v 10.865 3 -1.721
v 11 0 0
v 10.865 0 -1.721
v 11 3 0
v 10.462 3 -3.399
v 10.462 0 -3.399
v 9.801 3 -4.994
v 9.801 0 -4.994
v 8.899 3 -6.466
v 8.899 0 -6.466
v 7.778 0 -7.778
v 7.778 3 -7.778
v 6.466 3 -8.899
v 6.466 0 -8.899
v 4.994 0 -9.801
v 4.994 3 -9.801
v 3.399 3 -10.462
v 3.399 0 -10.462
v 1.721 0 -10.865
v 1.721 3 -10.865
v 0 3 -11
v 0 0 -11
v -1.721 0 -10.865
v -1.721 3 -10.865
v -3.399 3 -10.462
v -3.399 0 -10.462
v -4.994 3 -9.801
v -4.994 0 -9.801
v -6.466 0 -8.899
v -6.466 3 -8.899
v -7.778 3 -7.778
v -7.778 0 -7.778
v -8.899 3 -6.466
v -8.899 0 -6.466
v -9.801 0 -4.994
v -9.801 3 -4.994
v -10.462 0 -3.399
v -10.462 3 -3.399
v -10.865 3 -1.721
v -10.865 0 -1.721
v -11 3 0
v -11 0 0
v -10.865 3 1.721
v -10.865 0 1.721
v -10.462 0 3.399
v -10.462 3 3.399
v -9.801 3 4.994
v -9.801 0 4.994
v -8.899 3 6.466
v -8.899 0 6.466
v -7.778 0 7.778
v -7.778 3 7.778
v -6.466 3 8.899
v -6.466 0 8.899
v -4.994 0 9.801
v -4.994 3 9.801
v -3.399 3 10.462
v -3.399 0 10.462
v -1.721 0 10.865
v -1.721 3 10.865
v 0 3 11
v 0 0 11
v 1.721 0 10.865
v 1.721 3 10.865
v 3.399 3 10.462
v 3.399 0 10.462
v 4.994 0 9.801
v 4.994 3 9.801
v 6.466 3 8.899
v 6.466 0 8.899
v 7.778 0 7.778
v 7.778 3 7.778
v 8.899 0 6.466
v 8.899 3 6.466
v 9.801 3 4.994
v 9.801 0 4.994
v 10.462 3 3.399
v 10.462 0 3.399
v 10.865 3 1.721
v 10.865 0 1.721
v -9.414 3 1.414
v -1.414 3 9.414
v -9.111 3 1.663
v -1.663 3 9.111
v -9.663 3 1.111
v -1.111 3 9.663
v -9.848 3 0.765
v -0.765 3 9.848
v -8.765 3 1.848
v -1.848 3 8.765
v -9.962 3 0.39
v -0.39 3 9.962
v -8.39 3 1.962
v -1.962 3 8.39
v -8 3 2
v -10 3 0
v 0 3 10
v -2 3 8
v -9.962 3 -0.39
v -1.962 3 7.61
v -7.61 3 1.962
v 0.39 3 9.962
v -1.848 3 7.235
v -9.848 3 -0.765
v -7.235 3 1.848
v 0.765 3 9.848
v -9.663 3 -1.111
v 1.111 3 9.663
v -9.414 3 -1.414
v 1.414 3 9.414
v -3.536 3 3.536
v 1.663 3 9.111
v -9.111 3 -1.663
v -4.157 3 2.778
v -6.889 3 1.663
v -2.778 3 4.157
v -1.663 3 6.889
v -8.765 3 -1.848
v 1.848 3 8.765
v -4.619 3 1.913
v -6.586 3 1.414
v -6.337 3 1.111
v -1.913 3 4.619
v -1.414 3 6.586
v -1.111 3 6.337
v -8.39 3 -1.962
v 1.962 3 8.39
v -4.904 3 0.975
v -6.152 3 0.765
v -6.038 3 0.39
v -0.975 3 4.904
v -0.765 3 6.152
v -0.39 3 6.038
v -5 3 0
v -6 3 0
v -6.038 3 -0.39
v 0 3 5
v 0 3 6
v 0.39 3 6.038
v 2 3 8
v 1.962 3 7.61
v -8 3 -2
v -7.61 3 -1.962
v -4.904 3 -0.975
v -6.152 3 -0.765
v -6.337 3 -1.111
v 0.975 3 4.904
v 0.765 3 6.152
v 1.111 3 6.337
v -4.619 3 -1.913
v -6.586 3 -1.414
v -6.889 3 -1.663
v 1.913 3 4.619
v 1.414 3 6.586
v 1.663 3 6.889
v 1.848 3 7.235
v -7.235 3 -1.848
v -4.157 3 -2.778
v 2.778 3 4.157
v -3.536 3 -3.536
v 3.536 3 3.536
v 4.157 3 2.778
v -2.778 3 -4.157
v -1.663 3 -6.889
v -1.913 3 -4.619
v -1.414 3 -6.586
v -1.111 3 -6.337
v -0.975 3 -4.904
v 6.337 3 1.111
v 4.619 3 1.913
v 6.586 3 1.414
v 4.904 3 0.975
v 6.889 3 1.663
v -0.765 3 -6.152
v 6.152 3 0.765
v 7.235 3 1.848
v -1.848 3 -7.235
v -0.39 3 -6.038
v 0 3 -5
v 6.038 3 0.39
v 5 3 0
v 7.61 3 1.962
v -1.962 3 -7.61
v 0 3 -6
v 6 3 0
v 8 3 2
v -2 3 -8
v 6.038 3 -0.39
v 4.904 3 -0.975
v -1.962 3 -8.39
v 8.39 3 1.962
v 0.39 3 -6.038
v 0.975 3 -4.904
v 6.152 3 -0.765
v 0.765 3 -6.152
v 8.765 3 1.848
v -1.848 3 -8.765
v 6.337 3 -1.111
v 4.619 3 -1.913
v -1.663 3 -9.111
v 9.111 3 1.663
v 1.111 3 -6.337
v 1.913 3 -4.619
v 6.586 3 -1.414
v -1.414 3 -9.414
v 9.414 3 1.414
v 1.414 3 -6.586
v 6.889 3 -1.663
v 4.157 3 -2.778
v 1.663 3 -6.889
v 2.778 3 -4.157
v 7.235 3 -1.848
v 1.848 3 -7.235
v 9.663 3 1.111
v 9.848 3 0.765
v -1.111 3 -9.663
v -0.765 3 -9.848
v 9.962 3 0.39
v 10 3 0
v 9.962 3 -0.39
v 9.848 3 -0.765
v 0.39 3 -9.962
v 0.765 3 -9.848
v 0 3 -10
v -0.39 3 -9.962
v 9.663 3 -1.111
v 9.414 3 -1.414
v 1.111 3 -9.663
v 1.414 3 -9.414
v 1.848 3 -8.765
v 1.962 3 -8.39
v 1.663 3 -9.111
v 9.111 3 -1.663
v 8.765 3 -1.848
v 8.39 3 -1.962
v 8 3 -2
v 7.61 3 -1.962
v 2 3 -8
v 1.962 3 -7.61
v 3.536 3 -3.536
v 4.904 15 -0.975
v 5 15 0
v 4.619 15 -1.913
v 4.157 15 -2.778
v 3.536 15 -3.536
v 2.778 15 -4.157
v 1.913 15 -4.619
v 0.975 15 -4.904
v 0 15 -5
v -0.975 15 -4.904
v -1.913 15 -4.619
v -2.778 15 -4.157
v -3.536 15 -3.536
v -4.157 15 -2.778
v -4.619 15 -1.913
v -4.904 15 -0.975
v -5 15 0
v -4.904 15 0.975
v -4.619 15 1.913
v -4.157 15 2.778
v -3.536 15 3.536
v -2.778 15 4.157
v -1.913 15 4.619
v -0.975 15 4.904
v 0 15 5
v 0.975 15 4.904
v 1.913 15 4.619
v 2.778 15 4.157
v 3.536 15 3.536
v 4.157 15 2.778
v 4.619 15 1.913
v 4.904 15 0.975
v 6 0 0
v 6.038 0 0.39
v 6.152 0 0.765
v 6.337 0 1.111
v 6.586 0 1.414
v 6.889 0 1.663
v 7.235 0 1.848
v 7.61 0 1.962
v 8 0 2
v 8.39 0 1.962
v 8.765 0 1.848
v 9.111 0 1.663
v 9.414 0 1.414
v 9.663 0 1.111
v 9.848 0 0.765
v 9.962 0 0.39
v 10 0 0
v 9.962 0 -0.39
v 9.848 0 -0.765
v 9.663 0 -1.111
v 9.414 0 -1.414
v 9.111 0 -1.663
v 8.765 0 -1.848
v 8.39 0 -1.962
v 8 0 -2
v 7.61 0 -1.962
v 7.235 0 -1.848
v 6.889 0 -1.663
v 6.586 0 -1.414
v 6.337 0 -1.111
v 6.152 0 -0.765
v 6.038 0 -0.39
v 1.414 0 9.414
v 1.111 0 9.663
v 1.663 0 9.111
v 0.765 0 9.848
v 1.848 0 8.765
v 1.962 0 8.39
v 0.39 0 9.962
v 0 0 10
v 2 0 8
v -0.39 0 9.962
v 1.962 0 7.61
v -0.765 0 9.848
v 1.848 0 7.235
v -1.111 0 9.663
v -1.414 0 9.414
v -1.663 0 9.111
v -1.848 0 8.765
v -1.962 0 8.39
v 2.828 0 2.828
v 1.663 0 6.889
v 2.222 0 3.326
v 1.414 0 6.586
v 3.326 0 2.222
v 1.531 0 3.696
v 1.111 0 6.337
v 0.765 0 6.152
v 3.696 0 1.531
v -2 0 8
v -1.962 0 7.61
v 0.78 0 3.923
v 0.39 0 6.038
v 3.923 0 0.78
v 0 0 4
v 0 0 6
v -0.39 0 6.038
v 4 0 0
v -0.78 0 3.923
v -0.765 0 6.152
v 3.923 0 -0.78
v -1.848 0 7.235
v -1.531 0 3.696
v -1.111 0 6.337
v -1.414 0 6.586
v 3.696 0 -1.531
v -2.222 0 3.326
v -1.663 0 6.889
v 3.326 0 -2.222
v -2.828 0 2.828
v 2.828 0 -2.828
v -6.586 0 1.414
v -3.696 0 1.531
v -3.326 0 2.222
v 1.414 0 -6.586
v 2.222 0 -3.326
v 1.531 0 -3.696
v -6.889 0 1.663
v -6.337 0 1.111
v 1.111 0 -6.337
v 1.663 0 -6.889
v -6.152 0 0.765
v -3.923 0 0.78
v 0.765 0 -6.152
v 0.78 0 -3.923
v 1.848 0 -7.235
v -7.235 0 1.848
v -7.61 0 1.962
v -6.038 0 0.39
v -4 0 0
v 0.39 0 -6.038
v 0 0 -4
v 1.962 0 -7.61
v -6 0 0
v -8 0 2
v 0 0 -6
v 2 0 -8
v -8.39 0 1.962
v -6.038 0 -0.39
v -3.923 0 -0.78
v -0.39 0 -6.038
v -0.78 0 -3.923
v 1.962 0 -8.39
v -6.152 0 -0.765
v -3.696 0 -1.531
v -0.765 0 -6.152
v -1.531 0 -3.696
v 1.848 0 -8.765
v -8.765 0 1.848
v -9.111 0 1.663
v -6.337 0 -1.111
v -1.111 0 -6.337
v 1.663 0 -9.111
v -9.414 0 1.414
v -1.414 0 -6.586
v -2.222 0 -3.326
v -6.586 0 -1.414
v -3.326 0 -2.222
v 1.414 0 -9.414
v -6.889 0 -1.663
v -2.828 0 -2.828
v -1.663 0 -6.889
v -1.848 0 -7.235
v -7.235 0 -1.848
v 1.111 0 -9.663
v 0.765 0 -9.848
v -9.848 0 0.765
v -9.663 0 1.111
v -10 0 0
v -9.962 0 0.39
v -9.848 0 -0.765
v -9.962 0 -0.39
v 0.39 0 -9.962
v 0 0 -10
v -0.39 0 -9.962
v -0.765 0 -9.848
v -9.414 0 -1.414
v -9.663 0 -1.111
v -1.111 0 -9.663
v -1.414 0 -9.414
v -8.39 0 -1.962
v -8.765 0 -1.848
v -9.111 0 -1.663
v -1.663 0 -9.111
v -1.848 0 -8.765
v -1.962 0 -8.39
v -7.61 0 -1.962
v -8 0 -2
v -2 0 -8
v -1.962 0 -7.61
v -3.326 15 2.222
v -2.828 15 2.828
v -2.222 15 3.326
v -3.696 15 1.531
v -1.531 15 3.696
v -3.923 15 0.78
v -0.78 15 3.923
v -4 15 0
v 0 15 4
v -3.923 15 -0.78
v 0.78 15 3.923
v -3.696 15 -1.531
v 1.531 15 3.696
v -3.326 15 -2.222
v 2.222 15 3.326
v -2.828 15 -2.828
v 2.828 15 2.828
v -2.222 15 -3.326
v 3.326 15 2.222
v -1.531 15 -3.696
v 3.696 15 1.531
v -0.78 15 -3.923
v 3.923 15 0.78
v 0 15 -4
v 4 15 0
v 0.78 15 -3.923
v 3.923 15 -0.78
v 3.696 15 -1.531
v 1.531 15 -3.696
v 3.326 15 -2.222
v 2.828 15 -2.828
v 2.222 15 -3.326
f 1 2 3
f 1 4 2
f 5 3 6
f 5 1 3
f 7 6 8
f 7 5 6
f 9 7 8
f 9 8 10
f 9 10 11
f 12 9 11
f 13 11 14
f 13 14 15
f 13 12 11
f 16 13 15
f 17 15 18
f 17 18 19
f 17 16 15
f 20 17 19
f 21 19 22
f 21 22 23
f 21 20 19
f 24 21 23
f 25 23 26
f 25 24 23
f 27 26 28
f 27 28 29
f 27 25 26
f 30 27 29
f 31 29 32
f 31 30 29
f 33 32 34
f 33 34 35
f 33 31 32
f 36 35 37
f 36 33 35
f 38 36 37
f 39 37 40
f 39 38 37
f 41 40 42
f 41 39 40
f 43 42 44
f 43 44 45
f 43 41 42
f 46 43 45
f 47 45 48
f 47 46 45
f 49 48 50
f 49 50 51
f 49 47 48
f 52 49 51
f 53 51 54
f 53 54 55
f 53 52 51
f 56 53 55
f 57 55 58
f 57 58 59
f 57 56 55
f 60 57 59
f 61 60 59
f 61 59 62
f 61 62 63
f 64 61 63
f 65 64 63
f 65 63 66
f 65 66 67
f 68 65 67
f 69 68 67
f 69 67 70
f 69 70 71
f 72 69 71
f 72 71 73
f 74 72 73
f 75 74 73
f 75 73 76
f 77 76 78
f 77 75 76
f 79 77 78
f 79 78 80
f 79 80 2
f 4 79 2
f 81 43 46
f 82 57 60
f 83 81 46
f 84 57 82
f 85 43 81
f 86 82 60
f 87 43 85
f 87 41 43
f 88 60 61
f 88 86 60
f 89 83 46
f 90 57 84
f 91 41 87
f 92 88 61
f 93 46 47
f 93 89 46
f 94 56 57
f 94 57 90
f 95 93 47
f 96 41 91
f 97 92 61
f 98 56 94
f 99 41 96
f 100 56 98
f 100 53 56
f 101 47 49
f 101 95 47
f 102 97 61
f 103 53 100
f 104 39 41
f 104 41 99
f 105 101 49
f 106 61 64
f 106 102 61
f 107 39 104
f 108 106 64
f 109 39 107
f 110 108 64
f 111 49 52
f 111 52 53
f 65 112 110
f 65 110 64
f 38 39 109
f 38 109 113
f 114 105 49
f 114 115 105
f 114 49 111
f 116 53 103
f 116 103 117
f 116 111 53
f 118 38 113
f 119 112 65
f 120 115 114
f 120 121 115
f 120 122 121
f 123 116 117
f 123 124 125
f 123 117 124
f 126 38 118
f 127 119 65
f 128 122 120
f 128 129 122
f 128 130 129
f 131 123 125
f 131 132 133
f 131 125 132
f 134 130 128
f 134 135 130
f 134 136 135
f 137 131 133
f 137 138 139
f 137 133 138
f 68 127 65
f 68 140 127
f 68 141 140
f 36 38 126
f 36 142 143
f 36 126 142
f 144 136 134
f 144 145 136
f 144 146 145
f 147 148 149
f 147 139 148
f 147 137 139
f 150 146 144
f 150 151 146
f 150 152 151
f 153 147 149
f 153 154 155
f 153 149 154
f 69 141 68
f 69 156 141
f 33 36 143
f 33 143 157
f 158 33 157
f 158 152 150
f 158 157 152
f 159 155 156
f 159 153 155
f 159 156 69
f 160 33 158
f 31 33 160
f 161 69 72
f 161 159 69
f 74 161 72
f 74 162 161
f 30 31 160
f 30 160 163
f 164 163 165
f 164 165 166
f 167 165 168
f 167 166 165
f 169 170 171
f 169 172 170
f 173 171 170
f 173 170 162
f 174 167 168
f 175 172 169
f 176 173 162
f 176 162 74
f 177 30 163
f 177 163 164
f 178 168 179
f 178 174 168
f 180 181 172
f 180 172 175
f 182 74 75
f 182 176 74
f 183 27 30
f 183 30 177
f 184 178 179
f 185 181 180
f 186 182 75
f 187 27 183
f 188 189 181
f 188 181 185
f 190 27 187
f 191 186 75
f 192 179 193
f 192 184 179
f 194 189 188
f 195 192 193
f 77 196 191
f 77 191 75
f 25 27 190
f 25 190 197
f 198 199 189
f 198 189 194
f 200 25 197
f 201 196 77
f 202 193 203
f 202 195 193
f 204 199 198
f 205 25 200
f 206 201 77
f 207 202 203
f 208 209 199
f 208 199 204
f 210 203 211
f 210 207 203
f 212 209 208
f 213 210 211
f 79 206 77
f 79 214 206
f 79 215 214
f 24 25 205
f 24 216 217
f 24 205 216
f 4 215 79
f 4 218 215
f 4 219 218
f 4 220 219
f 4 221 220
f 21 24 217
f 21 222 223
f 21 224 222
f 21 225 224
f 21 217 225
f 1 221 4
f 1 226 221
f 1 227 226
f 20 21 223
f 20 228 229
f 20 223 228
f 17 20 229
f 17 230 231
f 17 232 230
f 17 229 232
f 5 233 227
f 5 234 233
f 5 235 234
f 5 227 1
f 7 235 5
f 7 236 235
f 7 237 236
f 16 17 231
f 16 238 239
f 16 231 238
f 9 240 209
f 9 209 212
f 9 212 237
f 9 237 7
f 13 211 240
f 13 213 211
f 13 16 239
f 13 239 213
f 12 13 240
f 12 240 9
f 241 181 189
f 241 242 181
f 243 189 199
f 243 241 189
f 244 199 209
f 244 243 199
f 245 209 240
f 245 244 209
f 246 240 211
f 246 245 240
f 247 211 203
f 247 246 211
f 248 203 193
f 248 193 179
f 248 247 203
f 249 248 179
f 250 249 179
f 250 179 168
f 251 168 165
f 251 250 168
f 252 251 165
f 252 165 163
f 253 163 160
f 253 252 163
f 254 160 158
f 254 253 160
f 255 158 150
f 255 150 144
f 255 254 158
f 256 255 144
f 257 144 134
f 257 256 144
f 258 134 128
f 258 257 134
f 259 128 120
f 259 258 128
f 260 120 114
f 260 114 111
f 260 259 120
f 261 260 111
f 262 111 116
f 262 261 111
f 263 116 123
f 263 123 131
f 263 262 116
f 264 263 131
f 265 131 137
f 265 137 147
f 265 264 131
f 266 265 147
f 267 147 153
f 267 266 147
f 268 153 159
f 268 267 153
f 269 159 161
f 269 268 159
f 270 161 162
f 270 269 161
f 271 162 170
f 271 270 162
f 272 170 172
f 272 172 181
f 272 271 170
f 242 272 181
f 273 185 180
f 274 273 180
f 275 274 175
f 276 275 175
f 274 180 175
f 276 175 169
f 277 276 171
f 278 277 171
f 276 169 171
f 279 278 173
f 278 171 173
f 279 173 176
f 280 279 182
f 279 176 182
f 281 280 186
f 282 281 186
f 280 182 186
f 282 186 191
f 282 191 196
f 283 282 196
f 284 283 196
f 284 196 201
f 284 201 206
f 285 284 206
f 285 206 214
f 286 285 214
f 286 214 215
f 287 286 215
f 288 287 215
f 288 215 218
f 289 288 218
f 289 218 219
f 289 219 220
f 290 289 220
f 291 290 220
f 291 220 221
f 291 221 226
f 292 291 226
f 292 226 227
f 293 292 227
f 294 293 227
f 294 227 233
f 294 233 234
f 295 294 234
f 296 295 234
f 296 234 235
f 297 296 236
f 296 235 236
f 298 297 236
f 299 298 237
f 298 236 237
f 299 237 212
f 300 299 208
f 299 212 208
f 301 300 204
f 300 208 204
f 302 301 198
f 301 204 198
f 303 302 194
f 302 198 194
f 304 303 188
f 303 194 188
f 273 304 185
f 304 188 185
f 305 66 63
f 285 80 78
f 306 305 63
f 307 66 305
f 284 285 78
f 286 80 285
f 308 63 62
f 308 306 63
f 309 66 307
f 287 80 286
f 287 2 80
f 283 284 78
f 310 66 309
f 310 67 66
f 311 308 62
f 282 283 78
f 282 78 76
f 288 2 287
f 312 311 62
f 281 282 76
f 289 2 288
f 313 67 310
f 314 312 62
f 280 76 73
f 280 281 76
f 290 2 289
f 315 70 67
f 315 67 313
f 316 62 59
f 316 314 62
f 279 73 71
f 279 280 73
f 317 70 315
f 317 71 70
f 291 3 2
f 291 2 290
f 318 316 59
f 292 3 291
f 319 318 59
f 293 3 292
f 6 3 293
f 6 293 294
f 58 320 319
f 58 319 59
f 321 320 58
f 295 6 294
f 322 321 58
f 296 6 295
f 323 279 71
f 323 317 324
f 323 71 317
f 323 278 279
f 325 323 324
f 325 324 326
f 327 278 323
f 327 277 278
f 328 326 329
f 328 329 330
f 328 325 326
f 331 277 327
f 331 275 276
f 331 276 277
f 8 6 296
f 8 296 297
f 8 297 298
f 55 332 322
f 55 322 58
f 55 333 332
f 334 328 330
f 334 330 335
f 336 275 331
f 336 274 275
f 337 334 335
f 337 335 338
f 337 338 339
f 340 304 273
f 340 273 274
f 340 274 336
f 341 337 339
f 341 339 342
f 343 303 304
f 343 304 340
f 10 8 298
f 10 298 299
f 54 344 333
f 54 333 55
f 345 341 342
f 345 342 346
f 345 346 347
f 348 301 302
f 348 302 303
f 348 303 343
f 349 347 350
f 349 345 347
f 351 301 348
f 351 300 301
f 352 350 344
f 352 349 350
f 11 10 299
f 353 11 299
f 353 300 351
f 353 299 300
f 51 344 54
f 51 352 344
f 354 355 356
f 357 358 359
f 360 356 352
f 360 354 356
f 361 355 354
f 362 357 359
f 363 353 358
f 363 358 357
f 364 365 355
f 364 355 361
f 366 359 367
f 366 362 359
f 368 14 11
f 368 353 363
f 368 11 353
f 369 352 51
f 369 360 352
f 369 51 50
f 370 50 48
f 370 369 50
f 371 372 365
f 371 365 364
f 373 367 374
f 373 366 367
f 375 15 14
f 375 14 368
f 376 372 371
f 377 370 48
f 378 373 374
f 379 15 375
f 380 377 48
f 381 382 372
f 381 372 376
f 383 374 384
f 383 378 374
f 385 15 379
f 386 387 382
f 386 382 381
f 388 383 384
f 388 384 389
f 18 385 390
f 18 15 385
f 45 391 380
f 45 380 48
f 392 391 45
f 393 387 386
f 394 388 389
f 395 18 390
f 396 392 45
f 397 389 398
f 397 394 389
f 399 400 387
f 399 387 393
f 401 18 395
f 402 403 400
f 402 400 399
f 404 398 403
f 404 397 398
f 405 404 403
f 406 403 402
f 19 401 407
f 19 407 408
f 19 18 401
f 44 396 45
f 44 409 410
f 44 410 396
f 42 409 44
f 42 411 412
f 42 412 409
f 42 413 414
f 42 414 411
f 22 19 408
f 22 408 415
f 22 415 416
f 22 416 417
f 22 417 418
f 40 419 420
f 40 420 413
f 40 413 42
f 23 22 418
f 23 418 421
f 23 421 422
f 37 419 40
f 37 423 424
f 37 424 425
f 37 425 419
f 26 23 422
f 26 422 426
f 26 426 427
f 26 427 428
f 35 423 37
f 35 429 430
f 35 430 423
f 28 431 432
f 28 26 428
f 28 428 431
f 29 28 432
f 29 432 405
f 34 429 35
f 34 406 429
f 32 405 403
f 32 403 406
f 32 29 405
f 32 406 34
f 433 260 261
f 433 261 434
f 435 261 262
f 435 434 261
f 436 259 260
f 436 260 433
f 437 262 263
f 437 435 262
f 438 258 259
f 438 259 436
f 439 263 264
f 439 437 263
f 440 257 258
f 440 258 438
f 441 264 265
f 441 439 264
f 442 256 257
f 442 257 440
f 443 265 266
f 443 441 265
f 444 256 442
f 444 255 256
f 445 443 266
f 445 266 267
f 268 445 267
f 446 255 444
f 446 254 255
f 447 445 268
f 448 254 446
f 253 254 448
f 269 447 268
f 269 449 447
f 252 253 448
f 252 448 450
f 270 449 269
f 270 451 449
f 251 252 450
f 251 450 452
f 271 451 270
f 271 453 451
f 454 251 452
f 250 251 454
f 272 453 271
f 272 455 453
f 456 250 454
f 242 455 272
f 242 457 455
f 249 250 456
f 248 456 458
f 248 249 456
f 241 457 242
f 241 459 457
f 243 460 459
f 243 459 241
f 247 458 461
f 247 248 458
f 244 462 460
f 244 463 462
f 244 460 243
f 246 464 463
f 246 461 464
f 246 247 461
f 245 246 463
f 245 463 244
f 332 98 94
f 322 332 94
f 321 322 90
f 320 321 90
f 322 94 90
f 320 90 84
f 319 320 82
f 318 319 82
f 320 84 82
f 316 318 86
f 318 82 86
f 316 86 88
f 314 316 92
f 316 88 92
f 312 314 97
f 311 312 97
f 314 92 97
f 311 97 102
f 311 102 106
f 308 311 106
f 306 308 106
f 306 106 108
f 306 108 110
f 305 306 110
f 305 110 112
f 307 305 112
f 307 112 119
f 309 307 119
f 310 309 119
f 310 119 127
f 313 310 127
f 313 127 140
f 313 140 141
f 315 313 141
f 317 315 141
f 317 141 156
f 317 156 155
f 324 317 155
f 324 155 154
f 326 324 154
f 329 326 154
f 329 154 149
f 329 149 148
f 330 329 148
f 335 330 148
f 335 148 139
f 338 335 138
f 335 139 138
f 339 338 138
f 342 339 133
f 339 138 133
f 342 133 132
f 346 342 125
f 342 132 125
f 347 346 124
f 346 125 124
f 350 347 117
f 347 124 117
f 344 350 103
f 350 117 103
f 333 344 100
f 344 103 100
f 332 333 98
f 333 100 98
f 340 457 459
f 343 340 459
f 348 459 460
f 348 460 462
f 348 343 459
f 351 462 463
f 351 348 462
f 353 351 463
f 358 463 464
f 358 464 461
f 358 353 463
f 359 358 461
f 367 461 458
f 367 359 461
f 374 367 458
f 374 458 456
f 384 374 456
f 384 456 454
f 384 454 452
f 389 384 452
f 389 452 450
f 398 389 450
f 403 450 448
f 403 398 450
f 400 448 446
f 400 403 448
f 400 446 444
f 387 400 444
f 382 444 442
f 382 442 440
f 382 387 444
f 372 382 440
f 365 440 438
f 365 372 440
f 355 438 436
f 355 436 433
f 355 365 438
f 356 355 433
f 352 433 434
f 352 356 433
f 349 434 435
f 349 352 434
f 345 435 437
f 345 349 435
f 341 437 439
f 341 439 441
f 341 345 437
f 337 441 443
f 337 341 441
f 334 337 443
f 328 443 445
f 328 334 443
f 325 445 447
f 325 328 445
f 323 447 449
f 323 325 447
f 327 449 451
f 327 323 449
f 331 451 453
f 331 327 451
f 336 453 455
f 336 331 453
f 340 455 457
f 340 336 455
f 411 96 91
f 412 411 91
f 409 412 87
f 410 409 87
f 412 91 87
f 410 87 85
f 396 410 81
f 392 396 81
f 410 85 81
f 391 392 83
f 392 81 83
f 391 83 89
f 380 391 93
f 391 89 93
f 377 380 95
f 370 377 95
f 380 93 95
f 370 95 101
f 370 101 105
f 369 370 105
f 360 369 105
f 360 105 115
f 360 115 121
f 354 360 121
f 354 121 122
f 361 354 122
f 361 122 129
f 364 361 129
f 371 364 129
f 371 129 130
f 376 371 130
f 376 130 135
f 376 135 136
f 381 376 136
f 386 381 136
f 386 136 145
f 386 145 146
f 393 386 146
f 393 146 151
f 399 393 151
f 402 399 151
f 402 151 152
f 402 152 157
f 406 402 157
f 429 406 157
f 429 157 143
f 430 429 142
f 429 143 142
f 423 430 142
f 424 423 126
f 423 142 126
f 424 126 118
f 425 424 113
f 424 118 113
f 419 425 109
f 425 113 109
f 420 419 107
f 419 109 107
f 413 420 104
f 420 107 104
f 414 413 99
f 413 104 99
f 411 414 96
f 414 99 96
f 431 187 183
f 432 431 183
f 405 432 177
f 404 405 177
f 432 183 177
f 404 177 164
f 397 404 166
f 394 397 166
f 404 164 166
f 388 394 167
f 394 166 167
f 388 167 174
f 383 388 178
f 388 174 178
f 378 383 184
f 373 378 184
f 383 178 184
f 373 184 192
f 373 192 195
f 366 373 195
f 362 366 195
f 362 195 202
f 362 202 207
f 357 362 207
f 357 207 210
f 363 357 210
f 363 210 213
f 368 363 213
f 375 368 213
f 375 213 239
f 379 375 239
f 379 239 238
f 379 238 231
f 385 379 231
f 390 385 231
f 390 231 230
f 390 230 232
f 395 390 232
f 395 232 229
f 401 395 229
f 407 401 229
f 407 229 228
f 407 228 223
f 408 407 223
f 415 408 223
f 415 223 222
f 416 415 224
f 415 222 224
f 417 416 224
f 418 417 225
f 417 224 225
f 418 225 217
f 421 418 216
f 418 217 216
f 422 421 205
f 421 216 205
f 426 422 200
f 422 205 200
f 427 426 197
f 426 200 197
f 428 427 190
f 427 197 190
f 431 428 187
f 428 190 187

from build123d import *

# Parameters (mm, degrees)
SKETCH2_R          = 2
CUT_EXTRUDE1_DEPTH = 20.646882704


with BuildPart() as part:
    # Sketch1 → Revolve1 (revolve)
    with BuildSketch(Plane.XY, mode=Mode.PRIVATE) as revolve1_sk:
        Polygon((-4, 0), (-11, 0), (-11, 3), (-5, 3), (-5, 15), (-4, 15), align=None)
    revolve(revolve1_sk.sketch.rotate(Axis((0, -177.201778129, 0), (0, 1, 0)), 180), axis=Axis((0, -177.201778129, 0), (0, 1, 0)))

    # Sketch2 → Cut-Extrude1 (cut, through all)
    with BuildSketch(Plane(origin=(0, 3, 0), x_dir=(1, 0, 0), z_dir=(0, 1, 0))):
        with Locations(Location((0, 8, 0), (0, 0, 180))):
            Circle(SKETCH2_R)
        with Locations(Location((8, 0, 0), (0, 0, 180))):
            Circle(SKETCH2_R)
        with Locations(Location((0, -8, 0), (0, 0, 180))):
            Circle(SKETCH2_R)
        with Locations(Location((-8, 0, 0), (0, 0, 180))):
            Circle(SKETCH2_R)
    extrude(amount=-CUT_EXTRUDE1_DEPTH, mode=Mode.SUBTRACT)


solid = part.part
